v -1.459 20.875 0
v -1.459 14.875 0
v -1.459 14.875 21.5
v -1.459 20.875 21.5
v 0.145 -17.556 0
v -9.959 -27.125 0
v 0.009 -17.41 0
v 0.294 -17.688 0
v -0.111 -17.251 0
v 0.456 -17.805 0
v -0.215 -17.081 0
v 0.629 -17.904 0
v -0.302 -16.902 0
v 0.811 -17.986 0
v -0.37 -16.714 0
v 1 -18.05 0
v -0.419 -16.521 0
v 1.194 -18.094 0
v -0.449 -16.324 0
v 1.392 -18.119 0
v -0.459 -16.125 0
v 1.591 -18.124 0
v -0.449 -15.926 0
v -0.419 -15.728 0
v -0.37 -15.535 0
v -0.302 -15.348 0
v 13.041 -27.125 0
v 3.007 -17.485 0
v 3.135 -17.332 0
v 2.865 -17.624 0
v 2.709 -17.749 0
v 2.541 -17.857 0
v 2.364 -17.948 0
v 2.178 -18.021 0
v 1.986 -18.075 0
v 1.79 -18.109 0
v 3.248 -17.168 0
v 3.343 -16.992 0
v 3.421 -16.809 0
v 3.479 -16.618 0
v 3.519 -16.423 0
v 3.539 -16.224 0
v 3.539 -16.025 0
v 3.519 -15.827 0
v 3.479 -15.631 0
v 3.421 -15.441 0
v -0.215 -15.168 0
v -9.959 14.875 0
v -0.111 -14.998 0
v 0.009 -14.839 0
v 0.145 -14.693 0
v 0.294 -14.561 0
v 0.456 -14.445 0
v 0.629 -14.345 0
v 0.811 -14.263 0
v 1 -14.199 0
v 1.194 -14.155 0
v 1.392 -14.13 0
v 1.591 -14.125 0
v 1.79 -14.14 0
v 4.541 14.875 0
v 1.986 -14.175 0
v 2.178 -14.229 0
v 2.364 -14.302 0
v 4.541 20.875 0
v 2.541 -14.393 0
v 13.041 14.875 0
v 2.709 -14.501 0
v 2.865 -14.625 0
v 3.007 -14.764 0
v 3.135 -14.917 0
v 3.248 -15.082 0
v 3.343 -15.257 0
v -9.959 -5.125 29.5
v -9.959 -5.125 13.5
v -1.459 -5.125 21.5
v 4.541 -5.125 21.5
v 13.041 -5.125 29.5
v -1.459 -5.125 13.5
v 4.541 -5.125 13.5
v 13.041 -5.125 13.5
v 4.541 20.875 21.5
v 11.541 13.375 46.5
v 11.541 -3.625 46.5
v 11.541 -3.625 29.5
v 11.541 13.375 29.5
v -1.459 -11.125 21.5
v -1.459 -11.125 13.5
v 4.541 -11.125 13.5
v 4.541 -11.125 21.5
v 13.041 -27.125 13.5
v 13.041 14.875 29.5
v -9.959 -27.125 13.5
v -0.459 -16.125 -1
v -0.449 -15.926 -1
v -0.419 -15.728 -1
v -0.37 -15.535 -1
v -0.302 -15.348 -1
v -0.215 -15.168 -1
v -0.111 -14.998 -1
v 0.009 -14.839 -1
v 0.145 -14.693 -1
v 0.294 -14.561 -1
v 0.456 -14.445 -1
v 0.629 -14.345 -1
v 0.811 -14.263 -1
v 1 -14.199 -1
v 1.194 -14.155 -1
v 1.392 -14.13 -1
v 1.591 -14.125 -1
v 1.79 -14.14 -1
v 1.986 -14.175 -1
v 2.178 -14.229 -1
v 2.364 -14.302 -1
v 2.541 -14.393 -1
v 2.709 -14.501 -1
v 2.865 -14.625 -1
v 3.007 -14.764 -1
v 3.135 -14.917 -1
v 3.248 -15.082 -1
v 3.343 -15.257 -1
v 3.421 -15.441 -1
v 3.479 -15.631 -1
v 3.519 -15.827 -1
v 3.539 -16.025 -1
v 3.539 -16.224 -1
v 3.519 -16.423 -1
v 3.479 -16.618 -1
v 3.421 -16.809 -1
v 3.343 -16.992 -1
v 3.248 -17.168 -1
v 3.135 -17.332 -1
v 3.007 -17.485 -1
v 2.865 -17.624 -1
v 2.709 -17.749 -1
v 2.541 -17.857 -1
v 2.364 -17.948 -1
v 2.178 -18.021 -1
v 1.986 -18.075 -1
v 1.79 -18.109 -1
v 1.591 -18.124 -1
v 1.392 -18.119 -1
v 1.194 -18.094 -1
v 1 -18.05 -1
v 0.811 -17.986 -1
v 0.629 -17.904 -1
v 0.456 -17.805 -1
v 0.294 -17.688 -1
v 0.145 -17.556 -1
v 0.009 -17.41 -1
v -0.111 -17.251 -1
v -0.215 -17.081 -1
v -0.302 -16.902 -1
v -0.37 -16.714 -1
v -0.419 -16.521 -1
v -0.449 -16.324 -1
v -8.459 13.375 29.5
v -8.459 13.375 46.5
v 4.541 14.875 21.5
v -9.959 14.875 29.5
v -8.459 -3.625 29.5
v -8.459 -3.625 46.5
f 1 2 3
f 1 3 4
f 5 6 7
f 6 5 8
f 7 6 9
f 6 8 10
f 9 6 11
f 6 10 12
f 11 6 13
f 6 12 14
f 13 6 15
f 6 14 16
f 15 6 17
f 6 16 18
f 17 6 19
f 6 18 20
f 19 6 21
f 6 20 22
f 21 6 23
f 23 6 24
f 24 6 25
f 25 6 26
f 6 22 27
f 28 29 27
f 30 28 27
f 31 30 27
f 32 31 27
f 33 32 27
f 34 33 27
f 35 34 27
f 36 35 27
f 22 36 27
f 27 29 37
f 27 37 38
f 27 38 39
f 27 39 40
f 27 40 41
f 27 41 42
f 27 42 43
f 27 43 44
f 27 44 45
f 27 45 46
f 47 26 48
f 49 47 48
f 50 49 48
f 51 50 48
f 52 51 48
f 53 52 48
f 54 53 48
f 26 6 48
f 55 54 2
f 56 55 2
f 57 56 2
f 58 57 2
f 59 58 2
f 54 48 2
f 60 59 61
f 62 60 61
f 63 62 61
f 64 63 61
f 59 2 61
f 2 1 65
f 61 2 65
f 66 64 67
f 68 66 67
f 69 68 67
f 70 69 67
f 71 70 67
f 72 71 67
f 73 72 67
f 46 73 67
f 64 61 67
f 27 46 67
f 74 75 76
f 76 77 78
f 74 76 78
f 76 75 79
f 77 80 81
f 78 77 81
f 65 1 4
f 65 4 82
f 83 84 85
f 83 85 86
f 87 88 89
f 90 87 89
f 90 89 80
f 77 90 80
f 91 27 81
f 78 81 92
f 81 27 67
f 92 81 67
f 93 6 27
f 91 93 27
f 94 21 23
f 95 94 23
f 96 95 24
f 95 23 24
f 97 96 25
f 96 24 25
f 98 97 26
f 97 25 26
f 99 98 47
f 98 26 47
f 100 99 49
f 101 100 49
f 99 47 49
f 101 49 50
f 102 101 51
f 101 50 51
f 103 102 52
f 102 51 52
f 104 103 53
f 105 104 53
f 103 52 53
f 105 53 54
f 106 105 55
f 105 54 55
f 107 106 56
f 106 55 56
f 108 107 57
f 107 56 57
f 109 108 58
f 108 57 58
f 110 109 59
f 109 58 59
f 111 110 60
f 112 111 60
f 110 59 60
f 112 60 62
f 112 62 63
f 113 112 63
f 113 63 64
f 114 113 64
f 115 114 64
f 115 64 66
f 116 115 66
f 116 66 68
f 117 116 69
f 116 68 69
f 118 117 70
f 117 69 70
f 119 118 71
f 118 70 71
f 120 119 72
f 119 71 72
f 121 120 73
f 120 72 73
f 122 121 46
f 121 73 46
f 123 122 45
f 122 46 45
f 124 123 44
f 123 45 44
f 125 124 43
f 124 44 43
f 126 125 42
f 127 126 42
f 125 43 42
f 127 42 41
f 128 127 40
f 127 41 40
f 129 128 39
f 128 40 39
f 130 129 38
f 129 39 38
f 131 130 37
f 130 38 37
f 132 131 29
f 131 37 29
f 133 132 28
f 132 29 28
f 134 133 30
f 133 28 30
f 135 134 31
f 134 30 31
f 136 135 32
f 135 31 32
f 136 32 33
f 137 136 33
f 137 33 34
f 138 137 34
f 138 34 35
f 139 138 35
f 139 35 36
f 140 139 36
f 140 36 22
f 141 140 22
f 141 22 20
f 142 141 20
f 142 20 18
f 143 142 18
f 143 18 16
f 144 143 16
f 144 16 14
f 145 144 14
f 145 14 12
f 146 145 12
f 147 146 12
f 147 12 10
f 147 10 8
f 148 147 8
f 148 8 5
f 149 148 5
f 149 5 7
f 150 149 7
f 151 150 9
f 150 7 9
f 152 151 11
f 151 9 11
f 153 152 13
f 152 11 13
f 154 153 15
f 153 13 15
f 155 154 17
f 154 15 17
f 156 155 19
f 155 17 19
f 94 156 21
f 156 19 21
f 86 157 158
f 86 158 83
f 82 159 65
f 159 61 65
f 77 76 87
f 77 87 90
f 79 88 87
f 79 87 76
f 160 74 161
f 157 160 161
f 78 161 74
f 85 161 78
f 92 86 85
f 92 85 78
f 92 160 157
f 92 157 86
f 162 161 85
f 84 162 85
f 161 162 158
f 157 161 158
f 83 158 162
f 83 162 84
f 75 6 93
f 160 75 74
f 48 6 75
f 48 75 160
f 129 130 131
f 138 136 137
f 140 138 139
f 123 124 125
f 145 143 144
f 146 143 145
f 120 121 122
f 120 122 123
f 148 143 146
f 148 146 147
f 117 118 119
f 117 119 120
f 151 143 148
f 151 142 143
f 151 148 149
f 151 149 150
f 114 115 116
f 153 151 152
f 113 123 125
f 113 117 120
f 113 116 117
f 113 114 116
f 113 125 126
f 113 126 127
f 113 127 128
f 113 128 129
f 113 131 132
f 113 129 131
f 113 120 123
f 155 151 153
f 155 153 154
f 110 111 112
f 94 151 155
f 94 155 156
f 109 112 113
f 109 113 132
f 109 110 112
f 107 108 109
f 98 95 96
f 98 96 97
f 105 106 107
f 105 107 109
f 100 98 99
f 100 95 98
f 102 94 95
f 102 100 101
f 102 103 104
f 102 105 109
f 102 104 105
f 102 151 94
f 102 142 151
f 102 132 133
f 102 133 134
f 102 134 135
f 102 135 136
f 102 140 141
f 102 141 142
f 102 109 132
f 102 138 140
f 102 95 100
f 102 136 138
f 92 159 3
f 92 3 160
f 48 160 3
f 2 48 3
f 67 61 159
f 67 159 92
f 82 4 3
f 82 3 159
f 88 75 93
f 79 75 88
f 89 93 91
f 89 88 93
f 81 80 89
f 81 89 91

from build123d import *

# Parameters (mm, degrees)
SALIENTE_EXTRUIR1_DEPTH = 13.5
CROQUIS2_R              = 2
SALIENTE_EXTRUIR2_DEPTH = 1
CROQUIS6_W              = 6
CROQUIS6_H              = 6
SALIENTE_EXTRUIR3_DEPTH = 8
CROQUIS7_W              = 6
CROQUIS7_H              = 6
SALIENTE_EXTRUIR4_DEPTH = 8
CROQUIS8_W              = 23
CROQUIS8_H              = 20
SALIENTE_EXTRUIR5_DEPTH = 16
CROQUIS9_W              = 20
CROQUIS9_H              = 17
SALIENTE_EXTRUIR6_DEPTH = 17


with BuildPart() as part:
    # Croquis1 → Saliente-Extruir1 (new body)
    with BuildSketch(Plane.XY):
        Polygon((-9.958809275, -27.124651578), (13.041190725, -27.124651578), (13.041190725, 14.875348422), (4.541190725, 14.875348422), (4.541190725, 20.875348422), (-1.458809275, 20.875348422), (-1.458809275, 14.875348422), (-9.958809275, 14.875348422), align=None)
    extrude(amount=SALIENTE_EXTRUIR1_DEPTH)

    # Croquis2 → Saliente-Extruir2 (add)
    with BuildSketch(Plane(origin=(0, 0, 0), x_dir=(-1, 0, 0), z_dir=(0, 0, -1))):
        with Locations((-1.541190725, -16.124651578)):
            Circle(CROQUIS2_R)
    extrude(amount=SALIENTE_EXTRUIR2_DEPTH)

    # Croquis6 → Saliente-Extruir3 (add)
    with BuildSketch(Plane.XY.offset(13.5)):
        with Locations((1.541190725, -8.124651578)):
            Rectangle(CROQUIS6_W, CROQUIS6_H)
    extrude(amount=SALIENTE_EXTRUIR3_DEPTH)

    # Croquis7 → Saliente-Extruir4 (add)
    with BuildSketch(Plane.XY.offset(13.5)):
        with Locations((1.541190725, 17.875348422)):
            Rectangle(CROQUIS7_W, CROQUIS7_H)
    extrude(amount=SALIENTE_EXTRUIR4_DEPTH)

    # Croquis8 → Saliente-Extruir5 (add)
    with BuildSketch(Plane.XY.offset(13.5)):
        with Locations((1.541190725, 4.875348422)):
            Rectangle(CROQUIS8_W, CROQUIS8_H)
    extrude(amount=SALIENTE_EXTRUIR5_DEPTH)

    # Croquis9 → Saliente-Extruir6 (add)
    with BuildSketch(Plane.XY.offset(29.5)):
        with Locations((1.541190725, 4.875348422)):
            Rectangle(CROQUIS9_W, CROQUIS9_H)
    extrude(amount=SALIENTE_EXTRUIR6_DEPTH)


solid = part.part
